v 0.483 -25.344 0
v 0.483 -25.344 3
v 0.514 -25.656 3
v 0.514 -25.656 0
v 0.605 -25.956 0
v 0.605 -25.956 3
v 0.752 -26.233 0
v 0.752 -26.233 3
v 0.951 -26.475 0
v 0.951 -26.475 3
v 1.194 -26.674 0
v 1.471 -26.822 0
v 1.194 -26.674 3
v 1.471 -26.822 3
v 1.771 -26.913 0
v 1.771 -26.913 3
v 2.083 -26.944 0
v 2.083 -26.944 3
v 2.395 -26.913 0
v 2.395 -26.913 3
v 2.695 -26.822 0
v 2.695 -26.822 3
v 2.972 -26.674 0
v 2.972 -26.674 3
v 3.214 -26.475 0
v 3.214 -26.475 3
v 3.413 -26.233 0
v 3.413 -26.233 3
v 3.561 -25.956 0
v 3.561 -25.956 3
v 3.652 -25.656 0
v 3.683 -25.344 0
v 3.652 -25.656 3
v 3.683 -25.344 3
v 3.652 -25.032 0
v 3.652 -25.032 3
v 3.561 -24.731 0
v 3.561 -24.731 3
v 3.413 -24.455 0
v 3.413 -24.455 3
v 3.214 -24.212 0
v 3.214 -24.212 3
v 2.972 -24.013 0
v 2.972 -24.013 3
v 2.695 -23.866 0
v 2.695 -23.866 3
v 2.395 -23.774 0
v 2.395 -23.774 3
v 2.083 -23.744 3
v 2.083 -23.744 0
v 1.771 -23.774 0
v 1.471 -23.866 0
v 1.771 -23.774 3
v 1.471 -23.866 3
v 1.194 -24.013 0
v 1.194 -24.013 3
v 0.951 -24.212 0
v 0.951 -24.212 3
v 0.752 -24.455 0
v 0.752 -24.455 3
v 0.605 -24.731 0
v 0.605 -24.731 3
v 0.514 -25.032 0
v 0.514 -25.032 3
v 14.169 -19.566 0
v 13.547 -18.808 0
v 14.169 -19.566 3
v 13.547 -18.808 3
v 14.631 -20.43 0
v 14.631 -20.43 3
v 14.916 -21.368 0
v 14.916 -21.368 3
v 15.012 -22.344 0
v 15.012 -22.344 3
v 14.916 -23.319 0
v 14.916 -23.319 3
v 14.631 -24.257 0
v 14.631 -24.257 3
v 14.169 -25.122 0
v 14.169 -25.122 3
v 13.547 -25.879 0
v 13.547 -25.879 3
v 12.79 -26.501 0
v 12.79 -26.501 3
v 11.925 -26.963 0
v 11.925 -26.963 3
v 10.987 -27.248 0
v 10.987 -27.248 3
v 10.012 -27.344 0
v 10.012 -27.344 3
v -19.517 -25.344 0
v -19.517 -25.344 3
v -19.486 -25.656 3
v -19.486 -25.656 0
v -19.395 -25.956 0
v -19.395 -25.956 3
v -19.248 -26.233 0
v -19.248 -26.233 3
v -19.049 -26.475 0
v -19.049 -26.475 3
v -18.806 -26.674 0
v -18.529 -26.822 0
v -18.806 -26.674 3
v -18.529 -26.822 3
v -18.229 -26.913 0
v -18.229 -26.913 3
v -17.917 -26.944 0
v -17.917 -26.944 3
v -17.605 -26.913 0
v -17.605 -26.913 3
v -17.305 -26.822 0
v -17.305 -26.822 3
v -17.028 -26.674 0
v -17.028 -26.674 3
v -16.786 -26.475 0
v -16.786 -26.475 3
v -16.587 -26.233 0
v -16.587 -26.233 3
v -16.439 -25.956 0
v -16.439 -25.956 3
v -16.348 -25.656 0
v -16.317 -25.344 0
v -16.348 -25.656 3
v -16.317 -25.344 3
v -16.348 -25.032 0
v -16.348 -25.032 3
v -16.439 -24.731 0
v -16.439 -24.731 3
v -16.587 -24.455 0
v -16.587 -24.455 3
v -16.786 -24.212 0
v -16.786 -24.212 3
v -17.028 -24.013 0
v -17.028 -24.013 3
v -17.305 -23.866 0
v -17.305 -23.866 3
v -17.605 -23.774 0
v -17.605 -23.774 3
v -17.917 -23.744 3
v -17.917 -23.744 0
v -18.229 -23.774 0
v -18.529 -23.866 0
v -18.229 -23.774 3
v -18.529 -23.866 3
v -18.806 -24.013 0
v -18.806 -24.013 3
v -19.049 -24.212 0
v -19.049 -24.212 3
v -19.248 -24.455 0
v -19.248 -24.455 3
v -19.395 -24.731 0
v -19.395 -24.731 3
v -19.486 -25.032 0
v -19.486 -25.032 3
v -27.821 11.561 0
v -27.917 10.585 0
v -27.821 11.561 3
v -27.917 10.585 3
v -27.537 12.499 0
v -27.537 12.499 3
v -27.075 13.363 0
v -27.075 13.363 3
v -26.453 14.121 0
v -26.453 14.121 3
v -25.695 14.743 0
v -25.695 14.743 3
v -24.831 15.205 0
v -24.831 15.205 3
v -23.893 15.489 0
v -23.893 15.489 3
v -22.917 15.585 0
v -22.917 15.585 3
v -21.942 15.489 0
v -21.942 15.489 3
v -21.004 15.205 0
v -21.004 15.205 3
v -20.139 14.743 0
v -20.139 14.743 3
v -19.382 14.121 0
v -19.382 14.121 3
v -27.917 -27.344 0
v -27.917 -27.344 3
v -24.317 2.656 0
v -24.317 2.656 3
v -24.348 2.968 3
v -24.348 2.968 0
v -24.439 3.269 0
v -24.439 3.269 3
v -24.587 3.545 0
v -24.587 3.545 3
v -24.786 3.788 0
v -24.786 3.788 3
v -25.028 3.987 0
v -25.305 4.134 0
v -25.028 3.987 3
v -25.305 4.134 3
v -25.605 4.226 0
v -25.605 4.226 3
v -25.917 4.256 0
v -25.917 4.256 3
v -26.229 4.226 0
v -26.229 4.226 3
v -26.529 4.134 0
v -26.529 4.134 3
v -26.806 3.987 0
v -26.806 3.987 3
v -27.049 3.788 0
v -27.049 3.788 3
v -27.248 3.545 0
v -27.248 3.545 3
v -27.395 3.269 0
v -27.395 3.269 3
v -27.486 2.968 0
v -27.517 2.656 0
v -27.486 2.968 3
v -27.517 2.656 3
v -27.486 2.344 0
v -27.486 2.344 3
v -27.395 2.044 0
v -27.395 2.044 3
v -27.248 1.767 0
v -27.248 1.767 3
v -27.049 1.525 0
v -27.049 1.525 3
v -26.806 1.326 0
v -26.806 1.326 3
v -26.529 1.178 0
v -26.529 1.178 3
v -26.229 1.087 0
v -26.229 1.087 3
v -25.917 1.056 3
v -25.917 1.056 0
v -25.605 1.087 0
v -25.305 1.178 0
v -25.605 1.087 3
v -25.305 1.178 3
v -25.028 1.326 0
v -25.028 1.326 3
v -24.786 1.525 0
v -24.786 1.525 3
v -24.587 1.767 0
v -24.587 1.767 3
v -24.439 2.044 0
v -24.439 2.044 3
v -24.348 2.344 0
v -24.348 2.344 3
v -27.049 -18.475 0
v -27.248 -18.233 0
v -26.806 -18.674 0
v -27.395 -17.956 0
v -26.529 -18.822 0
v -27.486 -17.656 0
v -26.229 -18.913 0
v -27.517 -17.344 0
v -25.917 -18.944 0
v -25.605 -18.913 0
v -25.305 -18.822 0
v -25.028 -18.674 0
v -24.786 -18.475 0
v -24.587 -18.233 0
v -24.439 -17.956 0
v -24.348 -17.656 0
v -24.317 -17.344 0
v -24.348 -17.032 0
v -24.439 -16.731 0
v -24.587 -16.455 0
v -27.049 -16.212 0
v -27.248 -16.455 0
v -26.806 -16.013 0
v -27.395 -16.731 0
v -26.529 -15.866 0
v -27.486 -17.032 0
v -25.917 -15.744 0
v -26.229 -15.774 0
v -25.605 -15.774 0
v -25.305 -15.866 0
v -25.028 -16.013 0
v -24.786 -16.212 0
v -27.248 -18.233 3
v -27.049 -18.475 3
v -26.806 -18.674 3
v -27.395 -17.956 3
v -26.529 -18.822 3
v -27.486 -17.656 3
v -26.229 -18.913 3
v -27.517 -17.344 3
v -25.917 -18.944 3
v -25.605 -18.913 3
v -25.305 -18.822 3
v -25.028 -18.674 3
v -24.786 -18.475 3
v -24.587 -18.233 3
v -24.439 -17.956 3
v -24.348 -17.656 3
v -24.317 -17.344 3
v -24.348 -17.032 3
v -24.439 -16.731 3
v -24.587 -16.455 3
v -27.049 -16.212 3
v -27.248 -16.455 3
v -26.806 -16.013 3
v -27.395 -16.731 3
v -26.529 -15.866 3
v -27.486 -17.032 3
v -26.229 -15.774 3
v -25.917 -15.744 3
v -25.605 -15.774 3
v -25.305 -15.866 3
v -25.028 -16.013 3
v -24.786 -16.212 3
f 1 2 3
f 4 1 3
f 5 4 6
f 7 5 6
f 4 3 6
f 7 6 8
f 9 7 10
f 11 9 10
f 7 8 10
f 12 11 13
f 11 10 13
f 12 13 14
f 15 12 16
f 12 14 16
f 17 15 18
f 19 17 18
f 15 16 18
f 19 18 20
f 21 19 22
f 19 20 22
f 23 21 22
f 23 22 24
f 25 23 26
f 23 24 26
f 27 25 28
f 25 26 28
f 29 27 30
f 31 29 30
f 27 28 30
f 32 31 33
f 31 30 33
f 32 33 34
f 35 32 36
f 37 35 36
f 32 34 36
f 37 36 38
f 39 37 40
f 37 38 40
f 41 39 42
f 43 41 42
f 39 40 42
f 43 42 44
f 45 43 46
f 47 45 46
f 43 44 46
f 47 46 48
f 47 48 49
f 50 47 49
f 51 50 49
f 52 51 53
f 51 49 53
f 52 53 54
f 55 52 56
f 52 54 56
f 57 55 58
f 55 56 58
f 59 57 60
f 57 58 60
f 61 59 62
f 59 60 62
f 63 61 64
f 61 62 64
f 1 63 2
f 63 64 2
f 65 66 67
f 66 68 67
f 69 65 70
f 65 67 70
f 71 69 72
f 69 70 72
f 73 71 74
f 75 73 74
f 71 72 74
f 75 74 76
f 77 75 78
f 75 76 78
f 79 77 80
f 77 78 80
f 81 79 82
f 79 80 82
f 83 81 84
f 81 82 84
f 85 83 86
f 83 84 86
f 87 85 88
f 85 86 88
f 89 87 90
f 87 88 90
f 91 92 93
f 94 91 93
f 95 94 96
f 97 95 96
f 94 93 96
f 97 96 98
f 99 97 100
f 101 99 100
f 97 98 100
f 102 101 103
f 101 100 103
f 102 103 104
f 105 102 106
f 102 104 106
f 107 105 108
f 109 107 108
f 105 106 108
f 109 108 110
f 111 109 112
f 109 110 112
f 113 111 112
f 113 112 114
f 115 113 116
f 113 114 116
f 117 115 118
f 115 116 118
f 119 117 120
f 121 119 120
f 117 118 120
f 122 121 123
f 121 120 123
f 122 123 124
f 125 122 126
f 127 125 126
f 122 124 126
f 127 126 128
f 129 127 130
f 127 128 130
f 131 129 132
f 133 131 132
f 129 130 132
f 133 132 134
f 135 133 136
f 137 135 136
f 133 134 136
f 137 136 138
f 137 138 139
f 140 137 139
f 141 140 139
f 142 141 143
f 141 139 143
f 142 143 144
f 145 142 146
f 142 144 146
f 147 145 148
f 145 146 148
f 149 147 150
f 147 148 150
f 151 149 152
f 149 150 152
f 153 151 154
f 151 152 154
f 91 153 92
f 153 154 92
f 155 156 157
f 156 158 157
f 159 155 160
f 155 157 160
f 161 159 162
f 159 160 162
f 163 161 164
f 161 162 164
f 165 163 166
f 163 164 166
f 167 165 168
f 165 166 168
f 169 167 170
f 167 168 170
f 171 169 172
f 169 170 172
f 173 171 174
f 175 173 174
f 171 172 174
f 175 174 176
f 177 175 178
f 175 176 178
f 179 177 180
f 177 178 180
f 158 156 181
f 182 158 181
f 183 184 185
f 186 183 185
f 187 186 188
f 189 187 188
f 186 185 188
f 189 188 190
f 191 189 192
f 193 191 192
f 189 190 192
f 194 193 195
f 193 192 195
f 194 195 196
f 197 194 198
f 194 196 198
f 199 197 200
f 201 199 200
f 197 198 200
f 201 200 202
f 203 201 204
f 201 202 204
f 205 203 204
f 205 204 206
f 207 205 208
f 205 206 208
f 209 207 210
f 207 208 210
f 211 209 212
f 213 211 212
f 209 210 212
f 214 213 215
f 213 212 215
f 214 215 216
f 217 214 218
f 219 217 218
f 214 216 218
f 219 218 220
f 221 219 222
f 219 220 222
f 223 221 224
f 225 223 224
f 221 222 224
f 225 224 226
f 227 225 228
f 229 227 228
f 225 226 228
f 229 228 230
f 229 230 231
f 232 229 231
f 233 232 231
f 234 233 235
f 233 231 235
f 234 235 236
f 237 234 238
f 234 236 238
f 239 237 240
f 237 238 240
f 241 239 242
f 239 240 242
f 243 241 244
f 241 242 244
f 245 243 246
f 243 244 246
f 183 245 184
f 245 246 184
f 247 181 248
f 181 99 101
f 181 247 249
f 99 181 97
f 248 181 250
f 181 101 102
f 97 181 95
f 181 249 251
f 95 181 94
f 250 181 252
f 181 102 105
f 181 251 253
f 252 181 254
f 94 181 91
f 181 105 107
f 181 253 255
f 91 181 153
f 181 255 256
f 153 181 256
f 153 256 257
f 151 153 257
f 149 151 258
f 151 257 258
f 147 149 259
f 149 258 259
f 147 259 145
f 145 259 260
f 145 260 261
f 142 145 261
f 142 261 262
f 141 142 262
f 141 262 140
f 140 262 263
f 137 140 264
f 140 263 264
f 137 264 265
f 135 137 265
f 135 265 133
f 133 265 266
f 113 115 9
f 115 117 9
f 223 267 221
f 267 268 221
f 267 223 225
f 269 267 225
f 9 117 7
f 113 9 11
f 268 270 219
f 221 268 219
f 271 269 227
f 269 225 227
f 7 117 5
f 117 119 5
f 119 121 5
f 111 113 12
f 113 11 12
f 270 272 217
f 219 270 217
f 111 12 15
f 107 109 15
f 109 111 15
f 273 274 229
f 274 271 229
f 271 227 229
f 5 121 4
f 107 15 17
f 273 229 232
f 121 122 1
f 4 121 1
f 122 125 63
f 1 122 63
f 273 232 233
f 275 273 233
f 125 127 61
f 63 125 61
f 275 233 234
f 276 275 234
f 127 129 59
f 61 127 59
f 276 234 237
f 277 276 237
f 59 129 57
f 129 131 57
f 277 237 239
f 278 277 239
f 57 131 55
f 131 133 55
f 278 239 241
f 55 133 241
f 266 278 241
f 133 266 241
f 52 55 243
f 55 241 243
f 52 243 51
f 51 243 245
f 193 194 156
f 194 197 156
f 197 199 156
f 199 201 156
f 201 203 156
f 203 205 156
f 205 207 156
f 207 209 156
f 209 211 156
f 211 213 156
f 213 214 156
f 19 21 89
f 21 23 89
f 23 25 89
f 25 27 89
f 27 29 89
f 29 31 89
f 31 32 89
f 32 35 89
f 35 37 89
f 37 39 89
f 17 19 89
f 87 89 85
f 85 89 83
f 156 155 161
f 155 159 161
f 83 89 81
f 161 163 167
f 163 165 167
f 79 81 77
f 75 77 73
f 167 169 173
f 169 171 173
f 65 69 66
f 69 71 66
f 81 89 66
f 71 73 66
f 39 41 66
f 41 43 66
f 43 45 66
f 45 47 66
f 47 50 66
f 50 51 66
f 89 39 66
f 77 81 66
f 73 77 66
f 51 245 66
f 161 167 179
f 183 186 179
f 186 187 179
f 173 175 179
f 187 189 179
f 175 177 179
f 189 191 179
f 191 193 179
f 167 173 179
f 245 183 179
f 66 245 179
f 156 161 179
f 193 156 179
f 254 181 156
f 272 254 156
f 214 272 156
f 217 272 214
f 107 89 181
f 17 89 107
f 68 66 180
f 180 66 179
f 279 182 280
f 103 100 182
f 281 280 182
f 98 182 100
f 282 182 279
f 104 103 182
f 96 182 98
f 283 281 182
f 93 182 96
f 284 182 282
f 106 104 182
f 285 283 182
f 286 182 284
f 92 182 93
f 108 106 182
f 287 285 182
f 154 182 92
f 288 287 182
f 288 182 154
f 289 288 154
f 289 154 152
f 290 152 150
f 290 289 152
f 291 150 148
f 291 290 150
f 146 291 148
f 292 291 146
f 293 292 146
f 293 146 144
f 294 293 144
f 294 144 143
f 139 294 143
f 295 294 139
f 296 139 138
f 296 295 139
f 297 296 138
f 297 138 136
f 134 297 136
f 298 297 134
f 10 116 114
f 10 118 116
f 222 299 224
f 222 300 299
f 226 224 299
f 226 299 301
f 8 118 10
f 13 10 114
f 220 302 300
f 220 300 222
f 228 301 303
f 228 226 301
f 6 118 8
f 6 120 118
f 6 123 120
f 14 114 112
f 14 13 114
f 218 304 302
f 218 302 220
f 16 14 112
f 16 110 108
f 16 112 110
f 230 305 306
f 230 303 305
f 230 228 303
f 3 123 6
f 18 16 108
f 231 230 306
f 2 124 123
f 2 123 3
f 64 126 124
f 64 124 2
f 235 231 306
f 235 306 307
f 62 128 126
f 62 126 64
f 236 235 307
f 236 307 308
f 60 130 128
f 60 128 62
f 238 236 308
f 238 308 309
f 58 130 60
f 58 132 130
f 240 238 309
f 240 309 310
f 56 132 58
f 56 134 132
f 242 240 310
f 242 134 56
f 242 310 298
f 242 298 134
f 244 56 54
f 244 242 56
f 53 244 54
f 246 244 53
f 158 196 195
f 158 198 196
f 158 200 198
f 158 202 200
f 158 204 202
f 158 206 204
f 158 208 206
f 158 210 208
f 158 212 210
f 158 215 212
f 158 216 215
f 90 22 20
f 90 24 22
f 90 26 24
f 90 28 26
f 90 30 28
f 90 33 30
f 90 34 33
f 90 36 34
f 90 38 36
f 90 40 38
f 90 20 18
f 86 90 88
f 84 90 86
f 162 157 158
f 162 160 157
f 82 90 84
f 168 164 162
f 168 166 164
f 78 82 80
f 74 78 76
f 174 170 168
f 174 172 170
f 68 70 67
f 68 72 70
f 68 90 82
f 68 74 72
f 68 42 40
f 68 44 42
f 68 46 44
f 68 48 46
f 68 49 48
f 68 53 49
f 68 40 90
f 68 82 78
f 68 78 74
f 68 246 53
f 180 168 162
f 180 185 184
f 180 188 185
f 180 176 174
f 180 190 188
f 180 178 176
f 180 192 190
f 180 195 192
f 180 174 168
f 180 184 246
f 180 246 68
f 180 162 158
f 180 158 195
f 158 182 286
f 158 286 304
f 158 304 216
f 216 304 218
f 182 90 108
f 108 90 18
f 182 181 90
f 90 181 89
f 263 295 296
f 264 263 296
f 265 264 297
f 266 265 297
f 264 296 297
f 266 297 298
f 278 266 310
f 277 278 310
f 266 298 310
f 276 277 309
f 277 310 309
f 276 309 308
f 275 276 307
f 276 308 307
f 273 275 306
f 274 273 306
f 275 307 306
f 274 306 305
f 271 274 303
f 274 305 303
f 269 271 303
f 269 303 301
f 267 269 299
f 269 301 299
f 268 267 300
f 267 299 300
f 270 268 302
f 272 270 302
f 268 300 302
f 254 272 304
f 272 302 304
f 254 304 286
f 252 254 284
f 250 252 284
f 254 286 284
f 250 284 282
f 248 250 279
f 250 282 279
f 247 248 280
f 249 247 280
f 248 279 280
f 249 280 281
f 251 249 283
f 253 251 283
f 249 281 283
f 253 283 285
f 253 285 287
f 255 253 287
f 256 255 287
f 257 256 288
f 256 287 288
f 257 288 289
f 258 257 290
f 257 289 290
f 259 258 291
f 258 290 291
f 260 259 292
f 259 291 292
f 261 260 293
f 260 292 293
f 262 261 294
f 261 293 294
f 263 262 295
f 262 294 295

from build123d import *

# Parameters (mm, degrees)
BOSS_EXTRUDE1_DEPTH = 3
SKETCH2_R           = 1.6
CUT_EXTRUDE1_DEPTH  = 3
FILLET2_R           = 5


with BuildPart() as part:
    # Sketch1 → Boss-Extrude1 (new body)
    with BuildSketch(Plane.XY):
        Polygon((-27.9172032, 22.65625), (-27.9172032, -27.34375), (22.0827968, -27.34375), align=None)
    extrude(amount=BOSS_EXTRUDE1_DEPTH)

    # Sketch2 → Cut-Extrude1 (cut)
    with BuildSketch(Plane.XY.offset(3)):
        with Locations((-25.9172032, -17.34375)):
            Circle(SKETCH2_R)
        with Locations((-25.9172032, 2.65625)):
            Circle(SKETCH2_R)
        with Locations(Location((-17.9172032, -25.34375, 0), (0, 0, 180))):
            Circle(SKETCH2_R)
        with Locations(Location((2.0827968, -25.34375, 0), (0, 0, 180))):
            Circle(SKETCH2_R)
    extrude(amount=-CUT_EXTRUDE1_DEPTH, mode=Mode.SUBTRACT)

    # Fillet2
    fillet2_edges = [part.edges().sort_by_distance(p)[0] for p in [
        (22.0827968, -27.34375, 1.5),
        (-27.9172032, 22.65625, 1.5),
    ]]
    fillet(fillet2_edges, radius=FILLET2_R)


solid = part.part
